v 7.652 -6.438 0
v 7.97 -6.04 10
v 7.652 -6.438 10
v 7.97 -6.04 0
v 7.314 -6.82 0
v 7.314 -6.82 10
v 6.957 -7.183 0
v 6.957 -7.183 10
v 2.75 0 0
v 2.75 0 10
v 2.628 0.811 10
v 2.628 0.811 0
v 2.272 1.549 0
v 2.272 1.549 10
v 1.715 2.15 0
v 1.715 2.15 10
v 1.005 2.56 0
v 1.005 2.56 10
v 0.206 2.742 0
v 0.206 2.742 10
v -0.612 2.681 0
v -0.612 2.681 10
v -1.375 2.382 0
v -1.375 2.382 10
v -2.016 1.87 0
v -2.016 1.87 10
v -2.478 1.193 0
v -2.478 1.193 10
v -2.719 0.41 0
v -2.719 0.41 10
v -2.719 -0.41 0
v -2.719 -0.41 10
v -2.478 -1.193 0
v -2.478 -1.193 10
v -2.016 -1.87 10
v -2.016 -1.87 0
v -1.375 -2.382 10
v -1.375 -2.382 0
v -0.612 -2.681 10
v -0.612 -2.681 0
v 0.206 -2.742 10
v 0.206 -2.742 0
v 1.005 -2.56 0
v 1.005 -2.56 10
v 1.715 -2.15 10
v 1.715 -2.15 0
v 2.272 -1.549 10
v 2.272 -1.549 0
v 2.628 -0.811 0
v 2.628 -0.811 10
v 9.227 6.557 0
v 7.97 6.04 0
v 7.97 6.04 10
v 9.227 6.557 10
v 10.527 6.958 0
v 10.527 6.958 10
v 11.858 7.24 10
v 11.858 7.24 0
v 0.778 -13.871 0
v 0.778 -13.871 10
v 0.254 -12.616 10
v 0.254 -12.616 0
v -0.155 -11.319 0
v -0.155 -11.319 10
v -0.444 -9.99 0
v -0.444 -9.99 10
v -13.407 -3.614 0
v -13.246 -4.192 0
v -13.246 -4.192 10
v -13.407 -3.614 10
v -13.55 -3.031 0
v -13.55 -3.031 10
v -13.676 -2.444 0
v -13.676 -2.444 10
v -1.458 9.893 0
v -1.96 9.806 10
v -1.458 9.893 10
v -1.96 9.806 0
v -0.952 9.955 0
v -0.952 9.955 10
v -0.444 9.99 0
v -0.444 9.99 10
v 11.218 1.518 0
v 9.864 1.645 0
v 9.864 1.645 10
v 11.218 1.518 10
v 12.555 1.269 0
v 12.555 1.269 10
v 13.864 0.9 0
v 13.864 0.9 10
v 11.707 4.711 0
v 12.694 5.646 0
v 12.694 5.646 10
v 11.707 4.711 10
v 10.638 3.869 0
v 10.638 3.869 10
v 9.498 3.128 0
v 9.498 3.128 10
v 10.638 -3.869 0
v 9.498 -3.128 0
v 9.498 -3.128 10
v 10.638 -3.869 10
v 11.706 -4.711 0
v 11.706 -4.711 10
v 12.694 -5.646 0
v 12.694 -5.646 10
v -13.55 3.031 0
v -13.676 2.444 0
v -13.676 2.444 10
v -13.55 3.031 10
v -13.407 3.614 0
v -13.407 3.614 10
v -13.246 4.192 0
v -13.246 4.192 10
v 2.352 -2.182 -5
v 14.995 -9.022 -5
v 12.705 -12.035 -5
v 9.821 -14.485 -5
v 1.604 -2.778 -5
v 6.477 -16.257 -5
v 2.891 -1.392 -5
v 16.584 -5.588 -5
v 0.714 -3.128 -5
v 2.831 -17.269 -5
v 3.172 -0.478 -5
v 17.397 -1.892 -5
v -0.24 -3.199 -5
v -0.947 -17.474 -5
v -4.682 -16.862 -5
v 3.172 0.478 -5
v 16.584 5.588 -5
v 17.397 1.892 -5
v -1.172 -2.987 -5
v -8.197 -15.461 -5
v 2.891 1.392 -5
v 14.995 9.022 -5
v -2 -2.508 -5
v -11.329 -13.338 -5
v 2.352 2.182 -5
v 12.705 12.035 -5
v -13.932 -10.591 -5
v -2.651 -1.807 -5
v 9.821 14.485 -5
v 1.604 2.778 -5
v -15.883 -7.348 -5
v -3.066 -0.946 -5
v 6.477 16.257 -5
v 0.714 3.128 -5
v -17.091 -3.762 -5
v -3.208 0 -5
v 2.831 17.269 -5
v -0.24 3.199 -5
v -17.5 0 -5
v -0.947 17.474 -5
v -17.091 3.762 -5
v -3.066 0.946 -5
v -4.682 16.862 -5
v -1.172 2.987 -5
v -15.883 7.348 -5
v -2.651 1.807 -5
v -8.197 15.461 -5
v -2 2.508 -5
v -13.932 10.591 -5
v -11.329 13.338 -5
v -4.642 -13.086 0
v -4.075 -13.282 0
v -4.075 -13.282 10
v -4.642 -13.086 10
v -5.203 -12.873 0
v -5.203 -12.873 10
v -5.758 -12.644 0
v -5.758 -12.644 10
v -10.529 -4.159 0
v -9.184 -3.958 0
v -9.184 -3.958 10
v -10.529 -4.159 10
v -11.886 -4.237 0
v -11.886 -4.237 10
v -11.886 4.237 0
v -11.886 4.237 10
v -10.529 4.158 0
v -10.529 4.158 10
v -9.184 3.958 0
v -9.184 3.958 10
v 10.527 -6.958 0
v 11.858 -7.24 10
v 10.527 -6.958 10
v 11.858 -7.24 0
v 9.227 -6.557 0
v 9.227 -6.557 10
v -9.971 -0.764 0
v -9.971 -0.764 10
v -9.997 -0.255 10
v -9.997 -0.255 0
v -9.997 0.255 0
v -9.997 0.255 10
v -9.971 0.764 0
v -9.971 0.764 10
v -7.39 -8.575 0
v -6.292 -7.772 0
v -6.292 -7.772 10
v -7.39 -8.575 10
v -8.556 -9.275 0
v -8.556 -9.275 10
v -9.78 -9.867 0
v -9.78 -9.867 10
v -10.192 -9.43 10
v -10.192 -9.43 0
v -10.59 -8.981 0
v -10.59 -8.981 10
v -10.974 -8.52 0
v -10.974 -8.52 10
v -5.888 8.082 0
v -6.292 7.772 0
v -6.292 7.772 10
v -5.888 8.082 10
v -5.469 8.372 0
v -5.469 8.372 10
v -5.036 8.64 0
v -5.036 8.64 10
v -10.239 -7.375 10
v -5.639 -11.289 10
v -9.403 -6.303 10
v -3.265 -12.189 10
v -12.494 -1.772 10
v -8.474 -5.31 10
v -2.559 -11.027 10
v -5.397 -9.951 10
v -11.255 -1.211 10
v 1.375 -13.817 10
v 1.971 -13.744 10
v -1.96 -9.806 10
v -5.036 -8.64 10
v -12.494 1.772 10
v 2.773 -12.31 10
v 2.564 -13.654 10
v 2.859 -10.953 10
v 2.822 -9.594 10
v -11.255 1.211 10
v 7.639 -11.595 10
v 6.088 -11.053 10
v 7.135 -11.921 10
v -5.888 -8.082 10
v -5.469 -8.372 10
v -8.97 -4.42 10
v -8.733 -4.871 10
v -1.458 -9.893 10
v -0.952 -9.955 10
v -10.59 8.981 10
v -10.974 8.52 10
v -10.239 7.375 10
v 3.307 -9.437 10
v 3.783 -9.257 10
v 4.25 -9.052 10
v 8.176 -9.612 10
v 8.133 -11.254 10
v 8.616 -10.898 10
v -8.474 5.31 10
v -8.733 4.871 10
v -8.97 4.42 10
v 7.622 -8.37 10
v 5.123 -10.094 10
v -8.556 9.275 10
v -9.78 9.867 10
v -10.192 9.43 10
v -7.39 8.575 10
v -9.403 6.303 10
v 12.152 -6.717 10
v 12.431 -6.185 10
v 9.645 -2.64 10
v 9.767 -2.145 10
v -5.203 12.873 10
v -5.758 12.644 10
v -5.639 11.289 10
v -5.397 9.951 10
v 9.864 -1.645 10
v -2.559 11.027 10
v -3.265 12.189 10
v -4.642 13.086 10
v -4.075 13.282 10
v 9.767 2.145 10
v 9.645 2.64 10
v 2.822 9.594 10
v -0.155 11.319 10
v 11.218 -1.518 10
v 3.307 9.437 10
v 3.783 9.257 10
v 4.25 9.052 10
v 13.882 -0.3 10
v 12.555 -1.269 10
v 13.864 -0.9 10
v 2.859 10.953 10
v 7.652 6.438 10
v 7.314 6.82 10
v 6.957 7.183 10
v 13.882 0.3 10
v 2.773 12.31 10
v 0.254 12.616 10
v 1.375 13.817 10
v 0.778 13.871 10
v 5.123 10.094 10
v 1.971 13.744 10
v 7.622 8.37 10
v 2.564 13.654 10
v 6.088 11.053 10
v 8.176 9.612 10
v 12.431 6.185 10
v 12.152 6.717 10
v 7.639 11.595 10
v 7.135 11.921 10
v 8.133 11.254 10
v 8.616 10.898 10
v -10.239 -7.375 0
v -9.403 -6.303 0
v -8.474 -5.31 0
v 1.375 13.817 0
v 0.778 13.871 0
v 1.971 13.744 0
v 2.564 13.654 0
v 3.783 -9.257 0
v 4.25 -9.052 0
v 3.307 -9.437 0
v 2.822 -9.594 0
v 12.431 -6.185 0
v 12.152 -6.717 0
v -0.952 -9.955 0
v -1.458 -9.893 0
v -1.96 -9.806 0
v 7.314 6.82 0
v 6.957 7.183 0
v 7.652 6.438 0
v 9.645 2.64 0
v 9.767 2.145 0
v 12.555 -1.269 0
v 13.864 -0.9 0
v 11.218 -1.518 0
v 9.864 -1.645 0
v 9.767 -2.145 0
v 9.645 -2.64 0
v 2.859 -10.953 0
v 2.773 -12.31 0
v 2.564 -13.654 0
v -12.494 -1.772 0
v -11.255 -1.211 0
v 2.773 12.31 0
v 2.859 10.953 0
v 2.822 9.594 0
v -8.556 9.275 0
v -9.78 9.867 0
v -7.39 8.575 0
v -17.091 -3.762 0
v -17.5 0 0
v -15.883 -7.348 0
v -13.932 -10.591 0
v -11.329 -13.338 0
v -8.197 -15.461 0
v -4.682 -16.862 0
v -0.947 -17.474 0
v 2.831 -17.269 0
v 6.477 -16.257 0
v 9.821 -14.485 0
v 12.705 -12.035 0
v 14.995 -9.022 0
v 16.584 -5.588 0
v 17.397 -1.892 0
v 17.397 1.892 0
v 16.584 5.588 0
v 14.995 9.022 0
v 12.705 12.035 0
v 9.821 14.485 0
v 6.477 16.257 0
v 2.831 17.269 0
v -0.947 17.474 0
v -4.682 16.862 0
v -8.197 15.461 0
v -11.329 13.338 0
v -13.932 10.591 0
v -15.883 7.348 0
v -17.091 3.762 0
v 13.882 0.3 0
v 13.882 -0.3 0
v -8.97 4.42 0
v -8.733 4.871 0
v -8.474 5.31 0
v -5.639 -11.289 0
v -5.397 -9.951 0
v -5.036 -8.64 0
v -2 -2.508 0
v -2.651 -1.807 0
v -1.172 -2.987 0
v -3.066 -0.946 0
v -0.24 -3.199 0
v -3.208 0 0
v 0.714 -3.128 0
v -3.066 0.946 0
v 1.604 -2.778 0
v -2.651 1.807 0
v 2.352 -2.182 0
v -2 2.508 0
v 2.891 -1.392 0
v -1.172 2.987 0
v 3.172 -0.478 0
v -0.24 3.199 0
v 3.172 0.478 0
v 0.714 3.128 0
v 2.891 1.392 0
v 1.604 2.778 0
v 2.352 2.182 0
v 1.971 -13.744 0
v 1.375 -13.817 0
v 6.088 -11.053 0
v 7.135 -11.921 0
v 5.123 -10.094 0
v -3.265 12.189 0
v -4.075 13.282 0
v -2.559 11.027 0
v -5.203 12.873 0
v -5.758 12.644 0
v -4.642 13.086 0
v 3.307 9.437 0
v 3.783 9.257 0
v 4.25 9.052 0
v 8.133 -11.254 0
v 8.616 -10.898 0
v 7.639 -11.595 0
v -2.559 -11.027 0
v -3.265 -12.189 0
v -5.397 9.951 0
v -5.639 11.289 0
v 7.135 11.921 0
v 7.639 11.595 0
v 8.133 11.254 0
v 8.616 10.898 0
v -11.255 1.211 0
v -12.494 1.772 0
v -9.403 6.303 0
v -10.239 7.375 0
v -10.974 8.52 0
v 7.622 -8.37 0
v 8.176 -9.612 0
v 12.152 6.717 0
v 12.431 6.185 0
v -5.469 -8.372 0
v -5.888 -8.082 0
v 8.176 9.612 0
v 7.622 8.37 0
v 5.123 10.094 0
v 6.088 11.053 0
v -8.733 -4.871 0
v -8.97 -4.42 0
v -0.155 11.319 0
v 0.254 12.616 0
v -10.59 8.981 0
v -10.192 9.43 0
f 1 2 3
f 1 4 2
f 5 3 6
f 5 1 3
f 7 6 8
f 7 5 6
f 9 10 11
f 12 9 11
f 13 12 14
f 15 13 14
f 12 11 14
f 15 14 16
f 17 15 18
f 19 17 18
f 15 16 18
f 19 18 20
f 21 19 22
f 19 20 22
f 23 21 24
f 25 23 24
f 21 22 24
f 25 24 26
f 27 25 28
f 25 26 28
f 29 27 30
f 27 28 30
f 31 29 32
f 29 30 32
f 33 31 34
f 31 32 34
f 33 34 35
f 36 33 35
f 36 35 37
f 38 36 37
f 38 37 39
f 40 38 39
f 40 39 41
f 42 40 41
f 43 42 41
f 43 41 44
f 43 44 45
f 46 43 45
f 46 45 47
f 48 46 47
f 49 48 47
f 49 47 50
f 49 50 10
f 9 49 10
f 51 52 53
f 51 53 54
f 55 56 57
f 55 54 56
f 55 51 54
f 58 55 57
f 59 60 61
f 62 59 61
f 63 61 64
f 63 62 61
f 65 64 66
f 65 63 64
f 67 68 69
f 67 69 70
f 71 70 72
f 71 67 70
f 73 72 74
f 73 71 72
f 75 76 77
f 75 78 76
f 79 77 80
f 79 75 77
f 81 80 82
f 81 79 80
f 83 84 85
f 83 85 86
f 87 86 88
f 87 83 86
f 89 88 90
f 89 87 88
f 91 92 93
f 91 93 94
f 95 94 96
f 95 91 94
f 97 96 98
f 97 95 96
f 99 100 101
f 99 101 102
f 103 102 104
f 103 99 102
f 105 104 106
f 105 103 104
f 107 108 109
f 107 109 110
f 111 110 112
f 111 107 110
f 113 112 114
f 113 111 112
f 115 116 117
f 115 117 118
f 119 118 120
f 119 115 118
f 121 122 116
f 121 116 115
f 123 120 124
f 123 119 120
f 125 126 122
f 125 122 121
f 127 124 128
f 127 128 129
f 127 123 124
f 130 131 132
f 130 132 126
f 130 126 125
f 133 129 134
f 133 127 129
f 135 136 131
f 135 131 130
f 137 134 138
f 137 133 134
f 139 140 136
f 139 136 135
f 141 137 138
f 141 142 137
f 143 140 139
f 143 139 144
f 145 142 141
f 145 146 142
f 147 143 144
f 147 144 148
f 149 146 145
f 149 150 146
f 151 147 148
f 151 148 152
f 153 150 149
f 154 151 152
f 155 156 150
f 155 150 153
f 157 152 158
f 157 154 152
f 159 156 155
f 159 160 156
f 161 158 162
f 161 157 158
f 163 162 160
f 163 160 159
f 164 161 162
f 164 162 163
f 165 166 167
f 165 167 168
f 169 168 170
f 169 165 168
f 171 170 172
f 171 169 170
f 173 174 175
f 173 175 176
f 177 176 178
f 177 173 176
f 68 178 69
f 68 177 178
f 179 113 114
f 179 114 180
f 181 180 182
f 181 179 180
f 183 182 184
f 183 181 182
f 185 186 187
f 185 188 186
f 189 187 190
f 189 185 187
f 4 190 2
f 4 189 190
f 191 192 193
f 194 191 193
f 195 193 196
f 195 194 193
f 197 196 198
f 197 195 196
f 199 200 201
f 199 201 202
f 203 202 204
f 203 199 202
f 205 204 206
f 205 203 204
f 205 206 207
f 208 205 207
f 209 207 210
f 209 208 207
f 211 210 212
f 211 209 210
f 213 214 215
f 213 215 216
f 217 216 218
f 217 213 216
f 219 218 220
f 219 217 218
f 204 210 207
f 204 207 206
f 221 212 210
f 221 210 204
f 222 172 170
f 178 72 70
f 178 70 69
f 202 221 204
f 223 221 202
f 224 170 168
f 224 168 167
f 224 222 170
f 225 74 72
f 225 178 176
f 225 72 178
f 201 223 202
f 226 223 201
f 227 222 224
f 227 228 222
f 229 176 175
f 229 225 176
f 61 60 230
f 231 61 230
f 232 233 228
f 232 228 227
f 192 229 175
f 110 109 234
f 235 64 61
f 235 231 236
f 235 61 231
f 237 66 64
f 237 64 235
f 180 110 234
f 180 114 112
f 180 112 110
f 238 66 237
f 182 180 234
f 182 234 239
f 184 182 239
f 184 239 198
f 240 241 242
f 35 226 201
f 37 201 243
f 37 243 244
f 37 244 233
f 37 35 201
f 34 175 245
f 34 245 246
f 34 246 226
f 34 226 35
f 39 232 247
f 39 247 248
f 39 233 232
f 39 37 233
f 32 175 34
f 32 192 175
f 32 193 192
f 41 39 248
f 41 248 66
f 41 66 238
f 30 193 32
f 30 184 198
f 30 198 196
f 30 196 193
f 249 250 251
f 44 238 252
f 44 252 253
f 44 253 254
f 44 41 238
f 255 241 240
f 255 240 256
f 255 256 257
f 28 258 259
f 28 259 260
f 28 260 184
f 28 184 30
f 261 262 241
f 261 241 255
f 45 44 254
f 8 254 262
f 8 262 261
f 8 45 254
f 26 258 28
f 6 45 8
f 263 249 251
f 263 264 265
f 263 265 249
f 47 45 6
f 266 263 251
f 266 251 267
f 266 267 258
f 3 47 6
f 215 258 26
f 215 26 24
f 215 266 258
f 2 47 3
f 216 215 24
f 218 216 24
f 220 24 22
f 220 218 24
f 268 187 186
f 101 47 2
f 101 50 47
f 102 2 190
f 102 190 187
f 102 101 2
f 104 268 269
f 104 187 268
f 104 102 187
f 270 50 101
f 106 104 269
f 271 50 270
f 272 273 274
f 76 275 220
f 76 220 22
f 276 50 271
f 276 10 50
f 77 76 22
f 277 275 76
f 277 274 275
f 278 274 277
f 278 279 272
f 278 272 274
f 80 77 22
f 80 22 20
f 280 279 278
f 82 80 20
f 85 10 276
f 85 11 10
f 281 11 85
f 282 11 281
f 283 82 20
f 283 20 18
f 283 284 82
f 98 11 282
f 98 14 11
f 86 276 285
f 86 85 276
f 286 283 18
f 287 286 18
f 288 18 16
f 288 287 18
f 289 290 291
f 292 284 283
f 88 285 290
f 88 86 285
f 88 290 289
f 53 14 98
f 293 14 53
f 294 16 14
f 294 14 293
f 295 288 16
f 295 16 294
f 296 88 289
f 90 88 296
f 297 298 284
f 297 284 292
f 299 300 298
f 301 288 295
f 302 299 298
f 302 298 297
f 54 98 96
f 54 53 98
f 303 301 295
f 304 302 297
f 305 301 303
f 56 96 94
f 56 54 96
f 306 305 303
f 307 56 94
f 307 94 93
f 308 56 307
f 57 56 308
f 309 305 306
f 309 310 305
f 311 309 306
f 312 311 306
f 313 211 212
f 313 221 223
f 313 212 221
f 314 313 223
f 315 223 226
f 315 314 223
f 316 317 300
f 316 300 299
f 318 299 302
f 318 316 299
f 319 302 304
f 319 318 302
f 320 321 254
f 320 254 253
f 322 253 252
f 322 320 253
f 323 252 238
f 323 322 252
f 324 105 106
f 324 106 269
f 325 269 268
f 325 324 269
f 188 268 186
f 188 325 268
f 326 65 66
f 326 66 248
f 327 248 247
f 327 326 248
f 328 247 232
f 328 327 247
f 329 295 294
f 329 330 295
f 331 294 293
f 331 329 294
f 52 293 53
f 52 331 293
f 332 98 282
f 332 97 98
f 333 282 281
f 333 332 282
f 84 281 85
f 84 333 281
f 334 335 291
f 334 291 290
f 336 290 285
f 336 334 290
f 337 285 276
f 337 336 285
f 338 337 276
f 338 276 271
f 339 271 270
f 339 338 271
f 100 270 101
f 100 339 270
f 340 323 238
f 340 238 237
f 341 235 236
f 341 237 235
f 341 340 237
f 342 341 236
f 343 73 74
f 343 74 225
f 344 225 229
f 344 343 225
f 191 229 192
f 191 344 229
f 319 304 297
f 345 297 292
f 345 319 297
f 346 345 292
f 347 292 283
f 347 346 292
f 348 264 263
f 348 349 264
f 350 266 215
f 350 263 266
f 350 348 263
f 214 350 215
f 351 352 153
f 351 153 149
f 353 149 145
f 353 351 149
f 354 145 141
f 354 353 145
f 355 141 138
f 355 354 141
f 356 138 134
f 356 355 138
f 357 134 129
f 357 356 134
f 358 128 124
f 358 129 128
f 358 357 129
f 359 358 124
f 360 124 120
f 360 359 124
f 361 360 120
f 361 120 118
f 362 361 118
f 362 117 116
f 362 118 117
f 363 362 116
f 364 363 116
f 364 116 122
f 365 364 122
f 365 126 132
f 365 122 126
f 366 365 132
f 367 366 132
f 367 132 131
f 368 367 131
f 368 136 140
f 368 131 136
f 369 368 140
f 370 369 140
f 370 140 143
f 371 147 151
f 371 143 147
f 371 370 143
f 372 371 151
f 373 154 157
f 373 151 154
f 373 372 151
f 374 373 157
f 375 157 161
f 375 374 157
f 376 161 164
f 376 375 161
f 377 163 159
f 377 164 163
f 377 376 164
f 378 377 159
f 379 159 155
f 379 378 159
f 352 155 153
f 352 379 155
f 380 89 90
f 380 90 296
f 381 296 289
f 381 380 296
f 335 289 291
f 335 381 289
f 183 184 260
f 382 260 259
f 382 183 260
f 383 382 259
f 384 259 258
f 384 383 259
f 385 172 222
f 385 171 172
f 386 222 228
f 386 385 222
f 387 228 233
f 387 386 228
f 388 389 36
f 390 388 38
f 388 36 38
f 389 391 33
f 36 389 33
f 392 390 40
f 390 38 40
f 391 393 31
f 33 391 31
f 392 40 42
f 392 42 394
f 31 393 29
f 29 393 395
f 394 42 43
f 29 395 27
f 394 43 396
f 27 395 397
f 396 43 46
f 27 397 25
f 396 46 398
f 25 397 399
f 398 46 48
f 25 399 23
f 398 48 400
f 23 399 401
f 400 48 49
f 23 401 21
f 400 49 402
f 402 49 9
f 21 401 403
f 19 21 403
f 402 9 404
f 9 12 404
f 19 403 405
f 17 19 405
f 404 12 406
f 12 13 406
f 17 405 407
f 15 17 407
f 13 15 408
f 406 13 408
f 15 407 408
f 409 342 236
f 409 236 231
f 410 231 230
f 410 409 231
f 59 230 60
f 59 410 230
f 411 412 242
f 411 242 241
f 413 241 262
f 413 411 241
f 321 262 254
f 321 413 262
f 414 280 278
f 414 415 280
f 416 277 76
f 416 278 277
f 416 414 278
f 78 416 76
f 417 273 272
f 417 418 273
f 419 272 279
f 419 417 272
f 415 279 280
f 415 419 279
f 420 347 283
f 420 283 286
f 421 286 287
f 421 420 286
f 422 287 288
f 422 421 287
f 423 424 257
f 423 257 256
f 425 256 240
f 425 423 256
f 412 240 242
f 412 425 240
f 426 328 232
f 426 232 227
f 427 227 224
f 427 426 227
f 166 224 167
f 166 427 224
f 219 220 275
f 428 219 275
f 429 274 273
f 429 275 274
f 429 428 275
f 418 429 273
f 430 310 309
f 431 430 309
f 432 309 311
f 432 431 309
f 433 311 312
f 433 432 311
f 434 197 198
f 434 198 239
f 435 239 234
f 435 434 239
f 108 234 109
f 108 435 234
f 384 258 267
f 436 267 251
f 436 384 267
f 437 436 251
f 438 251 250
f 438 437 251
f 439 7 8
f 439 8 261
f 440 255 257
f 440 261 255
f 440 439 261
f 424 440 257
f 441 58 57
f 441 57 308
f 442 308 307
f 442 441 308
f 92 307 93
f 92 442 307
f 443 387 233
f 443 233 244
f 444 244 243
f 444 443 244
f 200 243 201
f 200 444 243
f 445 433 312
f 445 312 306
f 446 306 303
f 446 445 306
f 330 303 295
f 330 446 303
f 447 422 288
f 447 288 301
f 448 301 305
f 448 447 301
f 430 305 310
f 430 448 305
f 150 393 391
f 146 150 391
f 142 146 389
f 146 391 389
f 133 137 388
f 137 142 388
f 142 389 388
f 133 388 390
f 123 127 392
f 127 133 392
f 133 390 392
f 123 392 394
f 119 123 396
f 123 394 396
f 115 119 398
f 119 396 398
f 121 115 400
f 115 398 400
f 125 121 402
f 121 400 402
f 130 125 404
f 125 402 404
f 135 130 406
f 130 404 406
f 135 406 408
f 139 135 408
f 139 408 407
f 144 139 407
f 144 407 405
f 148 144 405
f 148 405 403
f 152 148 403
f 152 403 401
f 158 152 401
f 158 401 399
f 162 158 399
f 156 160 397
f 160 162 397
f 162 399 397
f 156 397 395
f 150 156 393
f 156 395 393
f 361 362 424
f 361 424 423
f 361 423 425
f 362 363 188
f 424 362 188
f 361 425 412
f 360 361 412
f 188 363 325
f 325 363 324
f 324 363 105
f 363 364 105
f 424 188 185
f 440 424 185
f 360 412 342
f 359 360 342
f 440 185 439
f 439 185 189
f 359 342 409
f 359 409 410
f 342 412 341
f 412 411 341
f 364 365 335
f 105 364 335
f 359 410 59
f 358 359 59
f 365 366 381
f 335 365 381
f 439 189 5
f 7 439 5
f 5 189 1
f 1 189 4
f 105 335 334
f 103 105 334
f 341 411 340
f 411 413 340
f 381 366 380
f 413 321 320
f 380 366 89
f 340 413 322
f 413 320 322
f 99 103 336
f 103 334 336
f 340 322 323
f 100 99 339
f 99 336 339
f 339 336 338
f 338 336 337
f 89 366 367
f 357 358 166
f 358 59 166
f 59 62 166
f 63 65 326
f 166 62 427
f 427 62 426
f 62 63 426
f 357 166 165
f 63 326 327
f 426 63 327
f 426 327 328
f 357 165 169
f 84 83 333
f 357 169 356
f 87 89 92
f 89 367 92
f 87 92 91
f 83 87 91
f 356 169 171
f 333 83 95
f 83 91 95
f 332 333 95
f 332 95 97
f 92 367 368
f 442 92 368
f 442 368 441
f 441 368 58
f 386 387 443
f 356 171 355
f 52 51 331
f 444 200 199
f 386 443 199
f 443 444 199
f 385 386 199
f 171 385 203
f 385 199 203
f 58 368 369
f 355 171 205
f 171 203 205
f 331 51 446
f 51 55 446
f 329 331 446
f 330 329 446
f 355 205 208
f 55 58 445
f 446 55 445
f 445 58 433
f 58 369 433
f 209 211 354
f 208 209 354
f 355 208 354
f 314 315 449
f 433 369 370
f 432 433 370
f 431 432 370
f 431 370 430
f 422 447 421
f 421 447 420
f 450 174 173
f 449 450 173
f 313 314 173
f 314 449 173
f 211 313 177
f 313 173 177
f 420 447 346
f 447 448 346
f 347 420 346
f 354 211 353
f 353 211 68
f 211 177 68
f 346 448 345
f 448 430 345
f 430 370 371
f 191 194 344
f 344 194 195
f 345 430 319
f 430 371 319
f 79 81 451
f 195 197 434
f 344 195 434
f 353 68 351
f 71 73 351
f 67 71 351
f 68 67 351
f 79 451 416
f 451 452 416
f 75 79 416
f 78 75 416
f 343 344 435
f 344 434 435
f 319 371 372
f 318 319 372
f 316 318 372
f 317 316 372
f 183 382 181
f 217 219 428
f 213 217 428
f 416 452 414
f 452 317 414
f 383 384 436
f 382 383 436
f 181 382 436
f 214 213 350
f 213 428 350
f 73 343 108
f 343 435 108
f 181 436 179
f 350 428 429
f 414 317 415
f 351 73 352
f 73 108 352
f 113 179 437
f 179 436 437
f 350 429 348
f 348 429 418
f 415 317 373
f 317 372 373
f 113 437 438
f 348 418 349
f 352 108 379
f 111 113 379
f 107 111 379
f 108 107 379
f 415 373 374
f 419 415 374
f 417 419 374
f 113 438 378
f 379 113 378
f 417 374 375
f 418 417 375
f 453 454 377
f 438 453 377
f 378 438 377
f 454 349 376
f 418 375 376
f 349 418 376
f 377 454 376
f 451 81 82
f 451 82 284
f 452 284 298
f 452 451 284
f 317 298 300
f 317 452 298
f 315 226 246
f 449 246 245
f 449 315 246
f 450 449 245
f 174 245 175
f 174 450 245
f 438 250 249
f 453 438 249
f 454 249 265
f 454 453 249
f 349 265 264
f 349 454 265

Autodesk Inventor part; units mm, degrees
ref_plane "YZ Plane" through (0, 0, 0) normal (1, 0, 0) x (0, 1, 0)
ref_plane "XZ Plane" through (0, 0, 0) normal (0, 1, 0) x (-1, 0, 0)
ref_plane "XY Plane" through (0, 0, 0) normal (0, 0, 1) x (1, 0, 0)
sketch "Sketch1" plane through (0, 0, 0) normal (0, 0, 1) x (1, 0, 0)
  circle A0 centre (0, 0) radius 10
  arc A1 (13.8638, 0.9) -> (9.8638, 1.6449) centre (9.1431, -13.3378) ccw
  arc A2 (9.8638, -1.6449) -> (13.8638, -0.9) centre (9.1431, 13.3378) ccw
  arc A3 (13.8638, -0.9) -> (13.8638, 0.9) centre (-6.1159, 0) ccw
  line L0 (0, 0) -> (21.7354, 0) construction
  arc A4 (9.8638, -1.6449) -> (9.8638, 1.6449) centre (0, 0) ccw
  arc A5 (11.8575, 7.2397) -> (7.9696, 6.0404) centre (14.2942, -7.561) ccw
  arc A6 (12.694, 5.6459) -> (11.8575, 7.2397) centre (-5.4154, -2.8422) ccw
  arc A7 (9.4984, 3.1275) -> (12.694, 5.6459) centre (1.8975, 16.0591) ccw
  circle A8 centre (0, 0) radius 10
  arc A9 (9.4984, 3.1275) -> (7.9696, 6.0404) centre (0, 0) ccw
  arc A10 (7.1348, 11.9209) -> (4.2496, 9.0521) centre (16.1707, -0.0521) ccw
  arc A11 (8.6162, 10.8984) -> (7.1348, 11.9209) centre (-3.4743, -5.0333) ccw
  arc A12 (6.957, 7.1834) -> (8.6162, 10.8984) centre (-5.7829, 15.1014) ccw
  circle A13 centre (0, 0) radius 10
  arc A14 (6.957, 7.1834) -> (4.2496, 9.0521) centre (0, 0) ccw
  arc A15 (0.7777, 13.8712) -> (-0.4439, 9.9901) centre (14.3427, 7.4688) ccw
  arc A16 (2.5645, 13.6542) -> (0.7777, 13.8712) centre (-0.7372, -6.0714) ccw
  arc A17 (2.8218, 9.5936) -> (2.5645, 13.6542) centre (-12.1385, 10.6842) ccw
  circle A18 centre (0, 0) radius 10
  arc A19 (2.8218, 9.5936) -> (-0.4439, 9.9901) centre (0, 0) ccw
  arc A20 (-5.7577, 12.6437) -> (-5.0357, 8.6395) centre (9.2289, 13.2786) ccw
  arc A21 (-4.0747, 13.282) -> (-5.7577, 12.6437) centre (2.1687, -5.7185) ccw
  arc A22 (-1.9598, 9.8061) -> (-4.0747, 13.282) centre (-15.7133, 3.8193) ccw
  circle A23 centre (0, 0) radius 10
  arc A24 (-1.9598, 9.8061) -> (-5.0357, 8.6395) centre (0, 0) ccw
  arc A25 (-10.974, 8.5197) -> (-8.4739, 5.3097) centre (2.0009, 16.0465) ccw
  arc A26 (-9.7804, 9.8671) -> (-10.974, 8.5197) centre (4.5779, -4.0556) ccw
  arc A27 (-6.2924, 7.7721) -> (-9.7804, 9.8671) centre (-15.6884, -3.9205) ccw
  circle A28 centre (0, 0) radius 10
  arc A29 (-6.2924, 7.7721) -> (-8.4739, 5.3097) centre (0, 0) ccw
  arc A30 (-13.6763, 2.444) -> (-9.9708, 0.7635) centre (-5.6855, 15.1383) ccw
  arc A31 (-13.2456, 4.1917) -> (-13.6763, 2.444) centre (5.9382, -1.4636) ccw
  arc A32 (-9.1835, 3.9576) -> (-13.2456, 4.1917) centre (-12.0694, -10.7621) ccw
  circle A33 centre (0, 0) radius 10
  arc A34 (-9.1835, 3.9576) -> (-9.9708, 0.7635) centre (0, 0) ccw
  arc A35 (-13.2456, -4.1917) -> (-9.1835, -3.9576) centre (-12.0694, 10.7621) ccw
  arc A36 (-13.6763, -2.444) -> (-13.2456, -4.1917) centre (5.9382, 1.4636) ccw
  arc A37 (-9.9708, -0.7635) -> (-13.6763, -2.444) centre (-5.6855, -15.1383) ccw
  circle A38 centre (0, 0) radius 10
  arc A39 (-9.9708, -0.7635) -> (-9.1835, -3.9576) centre (0, 0) ccw
  arc A40 (-9.7804, -9.8671) -> (-6.2924, -7.7721) centre (-15.6884, 3.9205) ccw
  arc A41 (-10.974, -8.5197) -> (-9.7804, -9.8671) centre (4.5779, 4.0556) ccw
  arc A42 (-8.4739, -5.3097) -> (-10.974, -8.5197) centre (2.0009, -16.0465) ccw
  circle A43 centre (0, 0) radius 10
  arc A44 (-8.4739, -5.3097) -> (-6.2924, -7.7721) centre (0, 0) ccw
  arc A45 (-4.0747, -13.282) -> (-1.9598, -9.8061) centre (-15.7133, -3.8193) ccw
  arc A46 (-5.7577, -12.6437) -> (-4.0747, -13.282) centre (2.1687, 5.7185) ccw
  arc A47 (-5.0357, -8.6395) -> (-5.7577, -12.6437) centre (9.2289, -13.2786) ccw
  circle A48 centre (0, 0) radius 10
  arc A49 (-5.0357, -8.6395) -> (-1.9598, -9.8061) centre (0, 0) ccw
  arc A50 (2.5645, -13.6542) -> (2.8218, -9.5936) centre (-12.1385, -10.6842) ccw
  arc A51 (0.7777, -13.8712) -> (2.5645, -13.6542) centre (-0.7372, 6.0714) ccw
  arc A52 (-0.4439, -9.9901) -> (0.7777, -13.8712) centre (14.3427, -7.4688) ccw
  circle A53 centre (0, 0) radius 10
  arc A54 (-0.4439, -9.9901) -> (2.8218, -9.5936) centre (0, 0) ccw
  arc A55 (8.6162, -10.8984) -> (6.957, -7.1834) centre (-5.7829, -15.1014) ccw
  arc A56 (7.1348, -11.9209) -> (8.6162, -10.8984) centre (-3.4743, 5.0333) ccw
  arc A57 (4.2496, -9.0521) -> (7.1348, -11.9209) centre (16.1707, 0.0521) ccw
  circle A58 centre (0, 0) radius 10
  arc A59 (4.2496, -9.0521) -> (6.957, -7.1834) centre (0, 0) ccw
  arc A60 (12.694, -5.6459) -> (9.4984, -3.1275) centre (1.8975, -16.0591) ccw
  arc A61 (11.8575, -7.2397) -> (12.694, -5.6459) centre (-5.4154, 2.8422) ccw
  arc A62 (7.9696, -6.0404) -> (11.8575, -7.2397) centre (14.2942, 7.561) ccw
  circle A63 centre (0, 0) radius 10
  arc A64 (7.9696, -6.0404) -> (9.4984, -3.1275) centre (0, 0) ccw
  dimension "d0" = 20
  dimension "d3" = 15
  dimension "d4" = 15
  dimension "d5" = 4
  dimension "d6" = 20
  dimension "d7" = 1.8
  dimension "d10" = 360
extrude "Extrusion1" add sketch "Sketch1" along normal blind 10
sketch "Sketch2" plane through (0, 0, 10) normal (0, 0, 1) x (1, 0, 0)
  circle A0 centre (0, 0) radius 2.75
  dimension "d14" = 5.5
extrude "Extrusion2" cut sketch "Sketch2" against normal through all
sketch "Sketch3" plane through (0, 0, 0) normal (0, 0, -1) x (-1, 0, 0)
  circle A0 centre (0, 0) radius 17.5
  circle A1 centre (0, 0) radius 3.2083
  dimension "d17" = 35
extrude "Extrusion3" add sketch "Sketch3" along normal blind 5
properties part number "BA006" material "ABS Plastic"
